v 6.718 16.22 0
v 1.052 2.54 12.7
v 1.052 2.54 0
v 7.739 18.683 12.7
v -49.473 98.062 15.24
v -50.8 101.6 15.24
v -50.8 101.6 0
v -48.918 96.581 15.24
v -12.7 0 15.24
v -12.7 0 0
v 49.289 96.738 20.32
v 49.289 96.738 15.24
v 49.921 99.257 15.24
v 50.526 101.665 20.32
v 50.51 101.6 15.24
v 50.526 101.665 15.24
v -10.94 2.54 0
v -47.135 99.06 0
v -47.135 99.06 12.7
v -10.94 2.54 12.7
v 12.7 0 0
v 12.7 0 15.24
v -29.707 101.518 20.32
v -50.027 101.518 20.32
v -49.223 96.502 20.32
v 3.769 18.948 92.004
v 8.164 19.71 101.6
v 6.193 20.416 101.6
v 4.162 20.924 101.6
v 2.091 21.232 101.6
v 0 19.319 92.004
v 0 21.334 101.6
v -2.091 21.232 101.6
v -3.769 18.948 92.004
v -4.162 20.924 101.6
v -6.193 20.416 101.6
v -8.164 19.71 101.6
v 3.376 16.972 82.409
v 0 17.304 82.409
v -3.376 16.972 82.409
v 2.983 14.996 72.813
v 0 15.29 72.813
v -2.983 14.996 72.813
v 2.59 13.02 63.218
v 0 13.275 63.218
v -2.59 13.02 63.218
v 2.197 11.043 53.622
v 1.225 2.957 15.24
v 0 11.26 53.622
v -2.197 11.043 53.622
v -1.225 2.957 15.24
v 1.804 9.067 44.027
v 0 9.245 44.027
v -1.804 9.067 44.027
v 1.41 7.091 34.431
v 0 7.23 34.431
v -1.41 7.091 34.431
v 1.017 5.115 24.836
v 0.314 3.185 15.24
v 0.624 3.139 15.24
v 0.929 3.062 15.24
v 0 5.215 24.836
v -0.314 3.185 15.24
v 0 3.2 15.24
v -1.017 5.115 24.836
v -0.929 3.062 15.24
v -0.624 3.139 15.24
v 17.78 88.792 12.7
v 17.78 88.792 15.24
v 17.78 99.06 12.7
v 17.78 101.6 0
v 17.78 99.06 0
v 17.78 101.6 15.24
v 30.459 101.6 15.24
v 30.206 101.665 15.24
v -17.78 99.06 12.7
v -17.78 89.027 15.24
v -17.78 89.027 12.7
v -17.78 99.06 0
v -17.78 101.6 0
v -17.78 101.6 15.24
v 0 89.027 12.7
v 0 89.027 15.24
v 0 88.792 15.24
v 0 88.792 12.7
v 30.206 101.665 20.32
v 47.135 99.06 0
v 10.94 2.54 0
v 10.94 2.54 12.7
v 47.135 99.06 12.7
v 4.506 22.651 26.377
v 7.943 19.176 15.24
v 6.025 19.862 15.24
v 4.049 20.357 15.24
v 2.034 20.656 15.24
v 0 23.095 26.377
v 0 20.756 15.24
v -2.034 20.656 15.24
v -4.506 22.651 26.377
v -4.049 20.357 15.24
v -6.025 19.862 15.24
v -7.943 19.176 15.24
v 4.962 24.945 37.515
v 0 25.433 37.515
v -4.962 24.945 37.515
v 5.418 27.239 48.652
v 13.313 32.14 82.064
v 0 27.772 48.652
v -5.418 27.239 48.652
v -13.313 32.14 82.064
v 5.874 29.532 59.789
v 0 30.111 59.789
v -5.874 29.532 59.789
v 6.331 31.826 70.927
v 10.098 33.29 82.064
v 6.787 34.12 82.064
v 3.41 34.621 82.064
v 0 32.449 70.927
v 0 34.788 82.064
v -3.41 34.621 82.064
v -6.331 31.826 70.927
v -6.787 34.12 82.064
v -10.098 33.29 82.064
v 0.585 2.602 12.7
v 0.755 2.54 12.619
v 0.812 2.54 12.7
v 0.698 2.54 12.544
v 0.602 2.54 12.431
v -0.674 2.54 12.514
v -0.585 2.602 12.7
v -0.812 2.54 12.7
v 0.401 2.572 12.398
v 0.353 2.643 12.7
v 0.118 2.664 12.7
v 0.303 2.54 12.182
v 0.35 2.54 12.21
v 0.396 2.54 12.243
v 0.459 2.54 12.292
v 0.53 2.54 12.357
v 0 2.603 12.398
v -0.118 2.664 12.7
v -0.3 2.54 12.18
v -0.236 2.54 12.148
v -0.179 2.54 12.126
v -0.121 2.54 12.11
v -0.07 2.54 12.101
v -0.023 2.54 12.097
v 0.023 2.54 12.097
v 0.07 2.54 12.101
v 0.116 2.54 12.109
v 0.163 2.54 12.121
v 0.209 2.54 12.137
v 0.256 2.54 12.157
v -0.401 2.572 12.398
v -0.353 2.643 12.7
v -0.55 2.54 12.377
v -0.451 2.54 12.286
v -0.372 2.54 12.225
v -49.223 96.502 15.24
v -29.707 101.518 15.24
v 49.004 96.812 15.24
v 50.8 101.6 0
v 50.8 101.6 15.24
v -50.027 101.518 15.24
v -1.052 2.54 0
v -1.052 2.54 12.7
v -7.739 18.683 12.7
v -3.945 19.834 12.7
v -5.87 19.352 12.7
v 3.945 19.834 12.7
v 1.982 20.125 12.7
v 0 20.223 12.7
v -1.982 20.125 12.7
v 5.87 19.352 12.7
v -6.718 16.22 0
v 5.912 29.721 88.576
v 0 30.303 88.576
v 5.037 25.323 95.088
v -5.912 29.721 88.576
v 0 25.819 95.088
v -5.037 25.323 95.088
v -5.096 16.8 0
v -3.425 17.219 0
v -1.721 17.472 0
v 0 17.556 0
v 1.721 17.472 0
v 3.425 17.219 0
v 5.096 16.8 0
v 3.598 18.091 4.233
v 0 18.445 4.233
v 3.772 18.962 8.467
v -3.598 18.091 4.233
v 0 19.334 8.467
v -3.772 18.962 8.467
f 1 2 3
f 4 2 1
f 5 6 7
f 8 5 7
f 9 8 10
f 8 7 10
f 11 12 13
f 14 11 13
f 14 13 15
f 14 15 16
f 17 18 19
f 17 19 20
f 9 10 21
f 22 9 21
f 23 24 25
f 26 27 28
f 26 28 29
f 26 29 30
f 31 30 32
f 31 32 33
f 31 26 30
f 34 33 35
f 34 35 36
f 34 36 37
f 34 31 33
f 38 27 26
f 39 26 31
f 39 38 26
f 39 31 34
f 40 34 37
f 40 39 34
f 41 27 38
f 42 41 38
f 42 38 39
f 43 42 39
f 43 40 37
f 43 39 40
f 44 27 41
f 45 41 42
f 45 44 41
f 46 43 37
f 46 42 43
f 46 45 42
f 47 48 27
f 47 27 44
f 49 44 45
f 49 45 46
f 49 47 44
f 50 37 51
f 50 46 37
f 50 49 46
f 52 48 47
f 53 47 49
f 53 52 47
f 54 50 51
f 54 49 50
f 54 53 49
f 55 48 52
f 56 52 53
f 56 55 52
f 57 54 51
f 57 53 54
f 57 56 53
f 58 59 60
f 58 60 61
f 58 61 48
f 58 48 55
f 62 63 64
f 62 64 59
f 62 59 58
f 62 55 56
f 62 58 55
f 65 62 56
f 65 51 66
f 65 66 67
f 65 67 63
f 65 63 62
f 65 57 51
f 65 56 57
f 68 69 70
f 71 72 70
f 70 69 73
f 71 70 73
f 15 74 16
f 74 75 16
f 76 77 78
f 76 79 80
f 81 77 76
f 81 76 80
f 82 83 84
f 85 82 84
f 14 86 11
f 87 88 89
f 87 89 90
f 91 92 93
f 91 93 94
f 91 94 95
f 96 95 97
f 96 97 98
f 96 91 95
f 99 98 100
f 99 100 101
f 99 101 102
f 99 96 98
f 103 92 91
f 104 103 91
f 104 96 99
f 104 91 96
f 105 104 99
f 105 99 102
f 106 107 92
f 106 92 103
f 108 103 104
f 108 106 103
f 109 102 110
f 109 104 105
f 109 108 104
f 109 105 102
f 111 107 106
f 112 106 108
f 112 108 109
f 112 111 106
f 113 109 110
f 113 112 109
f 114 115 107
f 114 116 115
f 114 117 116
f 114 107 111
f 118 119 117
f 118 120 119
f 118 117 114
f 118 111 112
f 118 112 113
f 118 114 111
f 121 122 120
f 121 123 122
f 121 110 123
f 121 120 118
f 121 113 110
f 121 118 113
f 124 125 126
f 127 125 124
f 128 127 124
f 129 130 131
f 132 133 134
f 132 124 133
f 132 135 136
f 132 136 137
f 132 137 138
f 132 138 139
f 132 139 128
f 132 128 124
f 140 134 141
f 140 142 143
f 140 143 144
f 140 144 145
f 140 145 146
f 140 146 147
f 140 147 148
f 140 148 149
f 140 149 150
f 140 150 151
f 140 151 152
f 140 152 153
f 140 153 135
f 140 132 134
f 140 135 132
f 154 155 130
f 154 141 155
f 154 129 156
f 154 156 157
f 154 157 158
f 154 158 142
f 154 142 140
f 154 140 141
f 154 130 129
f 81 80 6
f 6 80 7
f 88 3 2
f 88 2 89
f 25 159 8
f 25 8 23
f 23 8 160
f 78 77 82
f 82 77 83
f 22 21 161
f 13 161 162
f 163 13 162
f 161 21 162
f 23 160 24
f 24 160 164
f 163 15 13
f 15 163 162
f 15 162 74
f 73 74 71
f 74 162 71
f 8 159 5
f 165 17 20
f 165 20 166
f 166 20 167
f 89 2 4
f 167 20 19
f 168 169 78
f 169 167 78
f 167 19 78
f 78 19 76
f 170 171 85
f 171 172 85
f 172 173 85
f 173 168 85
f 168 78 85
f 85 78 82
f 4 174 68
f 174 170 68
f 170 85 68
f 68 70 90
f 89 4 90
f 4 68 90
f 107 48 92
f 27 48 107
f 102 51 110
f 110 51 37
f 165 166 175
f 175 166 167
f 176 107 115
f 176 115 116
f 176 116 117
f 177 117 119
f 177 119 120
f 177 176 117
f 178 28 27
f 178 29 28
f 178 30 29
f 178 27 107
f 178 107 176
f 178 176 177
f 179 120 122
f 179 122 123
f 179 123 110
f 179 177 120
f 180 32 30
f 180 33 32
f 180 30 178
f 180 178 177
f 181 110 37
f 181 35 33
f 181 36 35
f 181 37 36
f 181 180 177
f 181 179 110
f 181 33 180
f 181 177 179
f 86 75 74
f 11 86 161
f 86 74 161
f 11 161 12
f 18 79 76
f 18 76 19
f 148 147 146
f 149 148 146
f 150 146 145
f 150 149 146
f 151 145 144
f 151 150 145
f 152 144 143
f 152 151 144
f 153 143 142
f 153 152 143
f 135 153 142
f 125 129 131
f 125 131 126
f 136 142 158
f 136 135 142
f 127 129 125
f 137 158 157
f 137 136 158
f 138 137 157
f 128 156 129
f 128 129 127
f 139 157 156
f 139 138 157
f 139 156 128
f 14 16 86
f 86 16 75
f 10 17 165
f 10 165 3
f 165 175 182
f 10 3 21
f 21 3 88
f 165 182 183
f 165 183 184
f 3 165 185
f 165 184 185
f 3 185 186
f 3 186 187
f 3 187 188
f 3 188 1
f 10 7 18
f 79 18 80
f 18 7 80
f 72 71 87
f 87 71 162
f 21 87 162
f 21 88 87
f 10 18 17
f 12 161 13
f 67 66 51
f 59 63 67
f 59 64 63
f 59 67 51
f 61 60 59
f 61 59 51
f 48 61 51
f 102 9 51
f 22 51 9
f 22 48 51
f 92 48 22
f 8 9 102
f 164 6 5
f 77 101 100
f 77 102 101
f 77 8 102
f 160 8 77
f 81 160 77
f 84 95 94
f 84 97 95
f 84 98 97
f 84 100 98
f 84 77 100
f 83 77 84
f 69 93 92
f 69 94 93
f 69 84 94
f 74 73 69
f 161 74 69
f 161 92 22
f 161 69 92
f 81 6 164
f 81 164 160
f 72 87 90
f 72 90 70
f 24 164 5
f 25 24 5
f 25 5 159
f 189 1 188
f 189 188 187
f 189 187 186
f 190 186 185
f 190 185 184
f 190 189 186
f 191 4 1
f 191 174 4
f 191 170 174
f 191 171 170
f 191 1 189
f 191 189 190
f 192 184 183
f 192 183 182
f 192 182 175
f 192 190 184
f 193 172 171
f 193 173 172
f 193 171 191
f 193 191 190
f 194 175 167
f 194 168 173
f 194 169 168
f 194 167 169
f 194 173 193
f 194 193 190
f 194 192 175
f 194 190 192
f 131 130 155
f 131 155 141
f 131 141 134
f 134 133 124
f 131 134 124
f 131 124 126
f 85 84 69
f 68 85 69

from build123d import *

# Parameters (mm, degrees)
F1_DEPTH      = 15.24
F3_T          = -2.54
F5_ANGLE_BACK = 22.5
F5_ANGLE      = 45
F9_DEPTH      = 5.08
F10_W         = 17.78
F10_H         = 12.7
F11_DEPTH     = 15.241


with BuildPart() as f1:
    # F0 (on Top) → F1 (new body)
    with BuildSketch(Plane.XY):
        Polygon((-50.8, 101.6), (-12.7, 0), (12.7, 0), (50.8, 101.6), align=None)
    extrude(amount=F1_DEPTH)

    # F3
    f3_openings = [f1.faces().sort_by_distance(p)[0] for p in [
        (0, 60.96, 0),
    ]]
    offset(amount=F3_T, openings=f3_openings)

    # F4 (on plane+point) → F5 (revolve)
    with BuildSketch(Plane.YZ, mode=Mode.PRIVATE) as f5_sk:
        Polygon((21.3342867792, 101.6), (0, 0), (17.5560421489, 0), (34.7880832851, 82.0639282465), align=None)
    revolve(f5_sk.sketch.rotate(Axis((0, 0, 50.8), (0, 0, 1)), -F5_ANGLE_BACK), axis=Axis((0, 0, 50.8), (0, 0, 1)), revolution_arc=F5_ANGLE)

    # F8 (on plane+point) + F7 (on plane+point) → F9 (join)
    with BuildSketch(Plane.XY.offset(15.24)):
        Polygon((49.2891350908, 96.7381212808), (50.525897119, 101.6652725557), (30.205897119, 101.6652725557), align=None)
    with BuildSketch(Plane.XY.offset(15.24)):
        Polygon((-29.7071077564, 101.5182593561), (-50.0271077564, 101.5182593561), (-49.2234366628, 96.5022337608), align=None)
    extrude(amount=F9_DEPTH)

    # F10 (on plane+point) → F11 (cut, through all)
    with BuildSketch(Plane.XY.offset(15.24)):
        Polygon((17.78, 101.726842235), (0, 101.726842235), (0, 89.026842235), (0, 88.7915473778), (17.78, 88.7915473778), align=None)
        with Locations((-8.89, 95.376842235)):
            Rectangle(F10_W, F10_H)
    extrude(amount=-F11_DEPTH, mode=Mode.SUBTRACT)


solid = f1.part
